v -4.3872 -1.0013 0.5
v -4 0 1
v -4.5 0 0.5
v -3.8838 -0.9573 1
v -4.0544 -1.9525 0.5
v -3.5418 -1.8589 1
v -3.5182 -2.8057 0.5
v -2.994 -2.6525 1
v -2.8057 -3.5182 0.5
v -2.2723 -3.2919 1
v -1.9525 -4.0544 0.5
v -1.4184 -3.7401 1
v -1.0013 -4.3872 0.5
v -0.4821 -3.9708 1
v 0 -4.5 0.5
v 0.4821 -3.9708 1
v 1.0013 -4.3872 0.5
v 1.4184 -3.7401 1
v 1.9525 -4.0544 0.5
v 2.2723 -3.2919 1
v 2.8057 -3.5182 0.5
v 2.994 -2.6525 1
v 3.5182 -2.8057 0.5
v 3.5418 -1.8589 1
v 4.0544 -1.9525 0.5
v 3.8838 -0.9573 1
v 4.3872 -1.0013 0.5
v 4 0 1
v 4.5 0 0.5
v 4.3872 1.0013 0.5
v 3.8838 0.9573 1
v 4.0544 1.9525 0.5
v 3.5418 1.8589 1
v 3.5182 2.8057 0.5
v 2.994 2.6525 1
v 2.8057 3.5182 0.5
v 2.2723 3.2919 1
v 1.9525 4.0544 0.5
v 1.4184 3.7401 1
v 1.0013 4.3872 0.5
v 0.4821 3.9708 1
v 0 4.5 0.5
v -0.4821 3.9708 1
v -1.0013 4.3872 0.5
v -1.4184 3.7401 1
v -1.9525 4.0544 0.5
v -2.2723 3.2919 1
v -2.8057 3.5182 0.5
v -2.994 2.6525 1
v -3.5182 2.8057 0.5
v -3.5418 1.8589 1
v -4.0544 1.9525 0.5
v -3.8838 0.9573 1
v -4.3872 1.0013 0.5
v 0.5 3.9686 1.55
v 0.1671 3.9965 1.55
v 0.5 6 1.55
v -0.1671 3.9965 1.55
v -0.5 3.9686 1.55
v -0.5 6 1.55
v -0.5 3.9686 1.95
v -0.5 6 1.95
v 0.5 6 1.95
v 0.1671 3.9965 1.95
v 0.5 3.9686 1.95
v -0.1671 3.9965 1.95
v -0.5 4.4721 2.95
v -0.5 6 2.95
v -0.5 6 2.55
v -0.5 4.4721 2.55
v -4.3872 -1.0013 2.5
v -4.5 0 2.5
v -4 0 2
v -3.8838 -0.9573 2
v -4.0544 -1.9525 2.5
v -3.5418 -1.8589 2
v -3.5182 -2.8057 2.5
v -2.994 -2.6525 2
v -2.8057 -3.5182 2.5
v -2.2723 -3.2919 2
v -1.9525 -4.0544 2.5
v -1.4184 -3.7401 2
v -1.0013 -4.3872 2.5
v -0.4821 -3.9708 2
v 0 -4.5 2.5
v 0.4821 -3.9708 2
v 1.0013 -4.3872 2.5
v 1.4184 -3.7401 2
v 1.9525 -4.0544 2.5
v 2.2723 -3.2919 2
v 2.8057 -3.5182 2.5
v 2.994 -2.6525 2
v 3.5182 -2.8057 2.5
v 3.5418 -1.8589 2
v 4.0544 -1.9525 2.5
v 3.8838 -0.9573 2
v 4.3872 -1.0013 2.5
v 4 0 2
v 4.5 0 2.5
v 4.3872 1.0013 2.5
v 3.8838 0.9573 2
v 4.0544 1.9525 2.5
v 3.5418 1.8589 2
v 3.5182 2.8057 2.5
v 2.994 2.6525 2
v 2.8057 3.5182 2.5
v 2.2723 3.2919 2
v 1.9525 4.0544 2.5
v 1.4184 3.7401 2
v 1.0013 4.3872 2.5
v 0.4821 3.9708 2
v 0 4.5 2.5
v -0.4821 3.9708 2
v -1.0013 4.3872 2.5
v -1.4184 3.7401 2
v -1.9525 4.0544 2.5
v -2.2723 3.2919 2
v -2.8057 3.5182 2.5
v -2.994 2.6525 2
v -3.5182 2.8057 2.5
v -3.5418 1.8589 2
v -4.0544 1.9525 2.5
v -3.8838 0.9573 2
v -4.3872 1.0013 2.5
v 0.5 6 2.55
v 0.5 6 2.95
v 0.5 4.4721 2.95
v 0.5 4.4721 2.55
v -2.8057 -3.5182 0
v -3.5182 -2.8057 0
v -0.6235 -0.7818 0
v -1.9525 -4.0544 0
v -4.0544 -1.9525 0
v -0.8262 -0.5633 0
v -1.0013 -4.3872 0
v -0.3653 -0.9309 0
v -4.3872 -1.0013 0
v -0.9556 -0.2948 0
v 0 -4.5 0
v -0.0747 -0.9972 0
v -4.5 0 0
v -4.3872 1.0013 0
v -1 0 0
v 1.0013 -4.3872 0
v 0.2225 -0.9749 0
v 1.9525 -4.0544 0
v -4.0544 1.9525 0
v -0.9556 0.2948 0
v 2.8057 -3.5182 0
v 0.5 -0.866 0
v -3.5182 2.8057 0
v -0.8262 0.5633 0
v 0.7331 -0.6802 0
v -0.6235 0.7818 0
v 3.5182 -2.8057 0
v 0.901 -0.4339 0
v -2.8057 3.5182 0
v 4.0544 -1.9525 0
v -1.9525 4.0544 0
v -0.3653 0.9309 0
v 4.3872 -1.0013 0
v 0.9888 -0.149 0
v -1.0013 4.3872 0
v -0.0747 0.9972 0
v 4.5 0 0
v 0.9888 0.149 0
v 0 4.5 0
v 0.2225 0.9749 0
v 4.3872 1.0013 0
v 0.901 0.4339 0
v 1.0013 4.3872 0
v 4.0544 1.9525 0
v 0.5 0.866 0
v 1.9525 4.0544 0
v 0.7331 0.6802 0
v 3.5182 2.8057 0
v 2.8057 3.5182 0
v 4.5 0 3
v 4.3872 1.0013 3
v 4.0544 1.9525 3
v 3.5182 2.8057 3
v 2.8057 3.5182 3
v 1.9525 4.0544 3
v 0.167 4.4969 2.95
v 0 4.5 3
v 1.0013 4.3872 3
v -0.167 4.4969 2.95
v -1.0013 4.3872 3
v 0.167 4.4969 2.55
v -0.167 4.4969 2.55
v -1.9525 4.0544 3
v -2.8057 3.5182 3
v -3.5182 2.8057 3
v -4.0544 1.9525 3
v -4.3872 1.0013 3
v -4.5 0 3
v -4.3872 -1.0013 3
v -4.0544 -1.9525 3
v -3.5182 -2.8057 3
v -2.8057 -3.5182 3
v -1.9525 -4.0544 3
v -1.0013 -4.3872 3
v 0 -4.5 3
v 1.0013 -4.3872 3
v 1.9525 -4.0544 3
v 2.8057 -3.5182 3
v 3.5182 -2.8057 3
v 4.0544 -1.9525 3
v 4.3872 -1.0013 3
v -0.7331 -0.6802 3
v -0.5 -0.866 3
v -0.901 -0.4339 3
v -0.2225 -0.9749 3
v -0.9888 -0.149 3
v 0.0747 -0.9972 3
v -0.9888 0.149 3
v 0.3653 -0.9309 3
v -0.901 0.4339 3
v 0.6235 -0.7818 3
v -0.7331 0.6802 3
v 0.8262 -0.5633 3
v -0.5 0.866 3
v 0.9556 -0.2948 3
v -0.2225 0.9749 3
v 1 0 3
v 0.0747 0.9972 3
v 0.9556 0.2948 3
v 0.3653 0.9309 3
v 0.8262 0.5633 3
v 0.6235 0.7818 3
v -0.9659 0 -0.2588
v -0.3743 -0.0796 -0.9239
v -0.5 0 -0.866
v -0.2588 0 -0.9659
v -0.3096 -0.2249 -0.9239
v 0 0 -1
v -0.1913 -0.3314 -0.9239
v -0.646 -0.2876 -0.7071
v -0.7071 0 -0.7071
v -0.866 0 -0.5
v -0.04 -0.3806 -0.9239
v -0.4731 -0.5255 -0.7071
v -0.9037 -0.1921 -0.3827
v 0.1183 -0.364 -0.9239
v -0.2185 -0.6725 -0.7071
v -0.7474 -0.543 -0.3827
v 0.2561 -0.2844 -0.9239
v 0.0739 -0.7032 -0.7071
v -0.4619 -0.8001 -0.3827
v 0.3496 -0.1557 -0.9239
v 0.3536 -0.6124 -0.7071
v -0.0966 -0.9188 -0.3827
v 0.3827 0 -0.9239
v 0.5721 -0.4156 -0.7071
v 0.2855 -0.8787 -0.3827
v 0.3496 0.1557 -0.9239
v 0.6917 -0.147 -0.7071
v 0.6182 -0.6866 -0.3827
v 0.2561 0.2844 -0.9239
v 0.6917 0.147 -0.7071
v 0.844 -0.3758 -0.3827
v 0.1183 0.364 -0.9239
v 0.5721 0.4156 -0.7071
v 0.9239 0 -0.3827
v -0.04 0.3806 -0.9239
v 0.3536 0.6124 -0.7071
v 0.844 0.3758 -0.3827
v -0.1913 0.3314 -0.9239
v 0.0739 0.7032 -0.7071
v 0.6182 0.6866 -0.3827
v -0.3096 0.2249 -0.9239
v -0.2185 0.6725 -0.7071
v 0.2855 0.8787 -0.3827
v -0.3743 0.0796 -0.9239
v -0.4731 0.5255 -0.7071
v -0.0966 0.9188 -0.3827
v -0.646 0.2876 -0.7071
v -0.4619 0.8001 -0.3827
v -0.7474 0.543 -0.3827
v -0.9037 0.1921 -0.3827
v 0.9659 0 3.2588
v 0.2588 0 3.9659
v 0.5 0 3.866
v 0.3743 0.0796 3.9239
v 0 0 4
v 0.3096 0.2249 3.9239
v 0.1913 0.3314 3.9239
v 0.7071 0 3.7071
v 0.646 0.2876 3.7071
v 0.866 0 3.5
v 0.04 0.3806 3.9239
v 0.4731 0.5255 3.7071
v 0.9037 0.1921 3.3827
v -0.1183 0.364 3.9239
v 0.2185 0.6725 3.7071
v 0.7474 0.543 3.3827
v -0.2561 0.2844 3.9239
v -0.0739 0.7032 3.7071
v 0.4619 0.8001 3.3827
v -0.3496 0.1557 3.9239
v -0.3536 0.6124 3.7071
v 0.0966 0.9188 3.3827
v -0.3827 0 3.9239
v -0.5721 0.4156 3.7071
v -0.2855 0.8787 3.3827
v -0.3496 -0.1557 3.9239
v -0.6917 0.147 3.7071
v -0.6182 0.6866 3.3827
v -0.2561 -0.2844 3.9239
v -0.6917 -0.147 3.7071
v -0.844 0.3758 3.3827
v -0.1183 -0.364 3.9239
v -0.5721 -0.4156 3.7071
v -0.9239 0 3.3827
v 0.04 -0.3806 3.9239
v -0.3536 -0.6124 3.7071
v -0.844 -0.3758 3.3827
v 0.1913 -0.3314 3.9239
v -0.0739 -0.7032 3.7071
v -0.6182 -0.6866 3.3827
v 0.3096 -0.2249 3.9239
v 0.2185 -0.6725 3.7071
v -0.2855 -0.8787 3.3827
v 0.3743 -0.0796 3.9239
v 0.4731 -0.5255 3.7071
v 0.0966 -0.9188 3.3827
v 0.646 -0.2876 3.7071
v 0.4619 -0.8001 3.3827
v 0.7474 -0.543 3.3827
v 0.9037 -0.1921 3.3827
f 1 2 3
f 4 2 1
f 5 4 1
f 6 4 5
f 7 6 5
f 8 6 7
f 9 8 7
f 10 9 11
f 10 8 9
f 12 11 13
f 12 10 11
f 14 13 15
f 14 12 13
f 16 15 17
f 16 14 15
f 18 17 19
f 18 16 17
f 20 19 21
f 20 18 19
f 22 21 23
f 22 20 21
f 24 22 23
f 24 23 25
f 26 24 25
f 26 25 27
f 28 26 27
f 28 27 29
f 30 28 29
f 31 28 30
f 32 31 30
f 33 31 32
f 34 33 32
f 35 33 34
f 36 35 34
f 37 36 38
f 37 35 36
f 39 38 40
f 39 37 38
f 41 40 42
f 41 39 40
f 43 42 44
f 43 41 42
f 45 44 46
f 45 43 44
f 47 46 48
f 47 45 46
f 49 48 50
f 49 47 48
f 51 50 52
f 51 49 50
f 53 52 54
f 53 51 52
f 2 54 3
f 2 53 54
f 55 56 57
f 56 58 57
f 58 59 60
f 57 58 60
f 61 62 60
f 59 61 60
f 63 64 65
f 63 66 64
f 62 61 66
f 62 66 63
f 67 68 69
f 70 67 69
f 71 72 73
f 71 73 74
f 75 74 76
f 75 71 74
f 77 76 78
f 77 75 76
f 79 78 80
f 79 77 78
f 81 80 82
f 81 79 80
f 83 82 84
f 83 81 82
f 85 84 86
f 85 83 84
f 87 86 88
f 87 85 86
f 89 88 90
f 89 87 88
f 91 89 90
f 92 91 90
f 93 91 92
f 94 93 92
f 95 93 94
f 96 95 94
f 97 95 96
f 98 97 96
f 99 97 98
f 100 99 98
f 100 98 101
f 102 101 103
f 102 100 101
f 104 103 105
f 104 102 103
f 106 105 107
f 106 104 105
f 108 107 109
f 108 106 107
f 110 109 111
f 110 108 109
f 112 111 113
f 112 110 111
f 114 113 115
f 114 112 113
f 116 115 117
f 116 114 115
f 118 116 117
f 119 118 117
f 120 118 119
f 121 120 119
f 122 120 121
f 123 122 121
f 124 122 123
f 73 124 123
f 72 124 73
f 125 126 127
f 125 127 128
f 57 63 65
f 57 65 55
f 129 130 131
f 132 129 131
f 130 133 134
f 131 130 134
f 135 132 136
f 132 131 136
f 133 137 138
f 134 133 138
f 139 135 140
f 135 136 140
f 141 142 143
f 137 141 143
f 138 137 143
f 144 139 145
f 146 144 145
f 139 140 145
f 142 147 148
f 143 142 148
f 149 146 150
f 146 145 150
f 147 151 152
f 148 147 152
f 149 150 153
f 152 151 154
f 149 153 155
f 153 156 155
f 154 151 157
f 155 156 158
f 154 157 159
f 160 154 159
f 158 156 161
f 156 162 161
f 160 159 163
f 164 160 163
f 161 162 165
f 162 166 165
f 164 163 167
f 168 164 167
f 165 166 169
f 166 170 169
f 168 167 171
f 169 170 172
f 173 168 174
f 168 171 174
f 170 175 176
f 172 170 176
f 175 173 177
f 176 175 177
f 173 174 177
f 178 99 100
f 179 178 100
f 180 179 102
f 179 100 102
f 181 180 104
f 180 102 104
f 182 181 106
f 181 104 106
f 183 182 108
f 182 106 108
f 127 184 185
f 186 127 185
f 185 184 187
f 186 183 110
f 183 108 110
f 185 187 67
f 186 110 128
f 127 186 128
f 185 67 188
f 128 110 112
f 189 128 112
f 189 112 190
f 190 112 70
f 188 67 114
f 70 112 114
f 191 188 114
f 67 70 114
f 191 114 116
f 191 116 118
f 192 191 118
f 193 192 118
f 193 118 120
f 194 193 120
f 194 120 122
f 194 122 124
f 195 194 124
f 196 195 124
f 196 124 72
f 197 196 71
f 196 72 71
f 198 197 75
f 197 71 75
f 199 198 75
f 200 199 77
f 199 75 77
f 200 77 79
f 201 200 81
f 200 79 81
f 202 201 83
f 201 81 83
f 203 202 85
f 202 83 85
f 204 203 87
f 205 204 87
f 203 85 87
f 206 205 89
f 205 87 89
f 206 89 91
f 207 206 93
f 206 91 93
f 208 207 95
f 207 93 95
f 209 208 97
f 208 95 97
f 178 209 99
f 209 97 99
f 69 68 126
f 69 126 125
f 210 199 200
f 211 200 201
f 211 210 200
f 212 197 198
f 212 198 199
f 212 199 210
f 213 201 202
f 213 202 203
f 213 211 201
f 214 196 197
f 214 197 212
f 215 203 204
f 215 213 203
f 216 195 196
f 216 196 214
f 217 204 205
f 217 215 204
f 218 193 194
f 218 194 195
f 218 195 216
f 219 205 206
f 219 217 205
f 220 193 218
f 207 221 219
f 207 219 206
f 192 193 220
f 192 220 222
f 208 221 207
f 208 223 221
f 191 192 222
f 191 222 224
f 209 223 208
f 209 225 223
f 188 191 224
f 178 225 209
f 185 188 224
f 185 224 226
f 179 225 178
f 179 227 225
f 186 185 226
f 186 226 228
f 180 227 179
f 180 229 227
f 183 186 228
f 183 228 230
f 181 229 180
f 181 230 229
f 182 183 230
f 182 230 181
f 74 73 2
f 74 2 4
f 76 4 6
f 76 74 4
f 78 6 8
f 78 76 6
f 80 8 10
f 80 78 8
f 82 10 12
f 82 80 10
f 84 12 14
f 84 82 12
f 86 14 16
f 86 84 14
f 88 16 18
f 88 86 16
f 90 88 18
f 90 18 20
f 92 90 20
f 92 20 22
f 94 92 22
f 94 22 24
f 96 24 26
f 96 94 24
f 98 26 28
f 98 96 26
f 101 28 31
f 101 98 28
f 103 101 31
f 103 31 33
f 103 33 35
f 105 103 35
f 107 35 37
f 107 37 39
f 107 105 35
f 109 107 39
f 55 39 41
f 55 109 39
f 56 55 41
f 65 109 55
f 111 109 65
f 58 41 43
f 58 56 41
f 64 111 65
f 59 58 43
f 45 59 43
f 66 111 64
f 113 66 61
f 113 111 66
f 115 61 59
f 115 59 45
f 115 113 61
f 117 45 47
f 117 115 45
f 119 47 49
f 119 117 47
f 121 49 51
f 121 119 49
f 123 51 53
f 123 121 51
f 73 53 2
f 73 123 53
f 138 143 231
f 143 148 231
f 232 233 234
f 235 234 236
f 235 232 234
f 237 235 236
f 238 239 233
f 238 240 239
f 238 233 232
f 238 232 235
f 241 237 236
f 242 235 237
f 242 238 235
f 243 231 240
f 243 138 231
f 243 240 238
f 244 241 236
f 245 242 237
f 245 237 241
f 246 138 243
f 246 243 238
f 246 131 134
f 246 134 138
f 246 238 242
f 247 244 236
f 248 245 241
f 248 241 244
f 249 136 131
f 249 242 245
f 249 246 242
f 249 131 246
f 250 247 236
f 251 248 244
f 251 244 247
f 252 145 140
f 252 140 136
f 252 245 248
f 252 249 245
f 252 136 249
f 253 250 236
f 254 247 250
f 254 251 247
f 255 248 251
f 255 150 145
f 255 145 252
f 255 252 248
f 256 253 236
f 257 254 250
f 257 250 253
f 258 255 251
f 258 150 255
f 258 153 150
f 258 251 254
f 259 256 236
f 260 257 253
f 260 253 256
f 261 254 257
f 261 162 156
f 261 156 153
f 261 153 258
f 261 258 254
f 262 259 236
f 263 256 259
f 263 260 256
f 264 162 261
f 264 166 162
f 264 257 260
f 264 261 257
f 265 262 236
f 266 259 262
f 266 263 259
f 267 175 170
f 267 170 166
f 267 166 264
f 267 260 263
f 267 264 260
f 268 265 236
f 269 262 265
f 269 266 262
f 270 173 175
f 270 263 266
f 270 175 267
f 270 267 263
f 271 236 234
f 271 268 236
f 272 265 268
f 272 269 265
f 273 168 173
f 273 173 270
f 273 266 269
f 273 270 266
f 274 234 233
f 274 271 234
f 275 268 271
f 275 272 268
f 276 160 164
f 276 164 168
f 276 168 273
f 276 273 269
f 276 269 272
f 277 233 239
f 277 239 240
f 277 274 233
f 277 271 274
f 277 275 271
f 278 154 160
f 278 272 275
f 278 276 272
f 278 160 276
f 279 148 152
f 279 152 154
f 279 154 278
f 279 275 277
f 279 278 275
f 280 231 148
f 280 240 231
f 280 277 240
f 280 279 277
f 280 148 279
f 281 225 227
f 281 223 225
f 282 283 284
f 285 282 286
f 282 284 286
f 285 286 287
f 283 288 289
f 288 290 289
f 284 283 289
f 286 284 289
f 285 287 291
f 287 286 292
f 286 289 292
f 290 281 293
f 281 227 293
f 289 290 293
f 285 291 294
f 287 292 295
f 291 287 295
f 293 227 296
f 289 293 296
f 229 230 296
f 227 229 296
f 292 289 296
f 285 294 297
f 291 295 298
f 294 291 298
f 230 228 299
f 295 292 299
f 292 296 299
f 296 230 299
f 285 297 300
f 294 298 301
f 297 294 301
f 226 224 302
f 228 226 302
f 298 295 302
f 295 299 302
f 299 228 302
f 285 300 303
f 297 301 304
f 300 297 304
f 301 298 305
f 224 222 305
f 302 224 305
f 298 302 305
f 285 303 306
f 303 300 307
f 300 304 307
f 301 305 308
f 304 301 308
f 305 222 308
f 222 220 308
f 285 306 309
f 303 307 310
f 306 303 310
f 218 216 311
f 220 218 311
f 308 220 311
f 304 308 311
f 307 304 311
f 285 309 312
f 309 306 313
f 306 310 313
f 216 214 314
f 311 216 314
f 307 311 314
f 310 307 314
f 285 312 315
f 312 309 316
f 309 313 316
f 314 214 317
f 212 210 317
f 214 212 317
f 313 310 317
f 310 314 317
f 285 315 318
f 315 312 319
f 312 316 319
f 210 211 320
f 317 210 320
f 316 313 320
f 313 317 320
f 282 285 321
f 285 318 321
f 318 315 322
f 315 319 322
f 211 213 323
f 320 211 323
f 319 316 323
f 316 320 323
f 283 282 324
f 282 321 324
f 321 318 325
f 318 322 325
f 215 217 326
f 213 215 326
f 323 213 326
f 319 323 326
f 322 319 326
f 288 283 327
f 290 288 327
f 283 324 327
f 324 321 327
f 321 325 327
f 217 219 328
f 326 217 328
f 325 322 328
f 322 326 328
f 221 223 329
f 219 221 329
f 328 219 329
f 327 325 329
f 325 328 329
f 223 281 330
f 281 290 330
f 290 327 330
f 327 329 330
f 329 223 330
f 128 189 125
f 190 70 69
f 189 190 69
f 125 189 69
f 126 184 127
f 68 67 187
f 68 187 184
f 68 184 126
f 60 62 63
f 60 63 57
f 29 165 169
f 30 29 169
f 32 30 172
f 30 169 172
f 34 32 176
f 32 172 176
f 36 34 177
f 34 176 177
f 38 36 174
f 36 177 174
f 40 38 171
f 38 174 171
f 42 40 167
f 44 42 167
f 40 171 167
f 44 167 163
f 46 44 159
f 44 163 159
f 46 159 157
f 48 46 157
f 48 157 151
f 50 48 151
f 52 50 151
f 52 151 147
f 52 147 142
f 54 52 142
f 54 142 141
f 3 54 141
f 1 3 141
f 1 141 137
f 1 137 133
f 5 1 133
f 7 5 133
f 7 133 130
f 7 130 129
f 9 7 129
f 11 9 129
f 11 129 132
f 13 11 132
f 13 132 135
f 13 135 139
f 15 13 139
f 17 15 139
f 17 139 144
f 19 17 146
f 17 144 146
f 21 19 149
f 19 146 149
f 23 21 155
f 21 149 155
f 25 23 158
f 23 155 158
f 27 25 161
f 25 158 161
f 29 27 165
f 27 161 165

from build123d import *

# Parameters (mm, degrees)
SKETCH1_R                = 4.5
MAIN_BASE_DEPTH          = 3
BOSS_EXTRUDE1_DEPTH      = 0.5
BOSS_EXTRUDE1_DEPTH_BACK = 0.5
SKETCH5_W                = 0.4
SKETCH5_H                = 2
SKETCH5_H_2              = 2.5


with BuildPart() as part:
    # Sketch1 → main_base (new body)
    with BuildSketch(Plane.XY):
        Circle(SKETCH1_R)
    extrude(amount=MAIN_BASE_DEPTH)

    # Sketch2 → pulley_cut_out (revolve, cut)
    with BuildSketch(Plane(origin=(0, 0, 0), x_dir=(0, 0, -1), z_dir=(1, 0, 0))):
        Polygon((-2.5, 4.5), (-0.5, 4.5), (-1, 4), (-2, 4), align=None)
    revolve(axis=Axis((0, 0, 0), (0, 0, 1)), mode=Mode.SUBTRACT)

    # Sketch4 → rotating_point (revolve)
    with BuildSketch(Plane(origin=(0, 0, 0), x_dir=(1, 0, 0), z_dir=(0, 1, 0))):
        with BuildLine():
            ThreePointArc((0, 1), (-0.707106781, 0.707106781), (-1, 0))
            Line((-1, 0), (0, 0))
            Line((0, 0), (0, 1))
        make_face()
        with BuildLine():
            Line((0, -4), (0, -3))
            Line((0, -3), (-1, -3))
            ThreePointArc((-1, -3), (-0.707106781, -3.707106781), (0, -4))
        make_face()
    revolve(axis=Axis((0, 0, -1), (0, 0, 1)))

    # Sketch5 → Boss-Extrude1 (add, two sides: drawn at the far end of the back side and taken through both)
    with BuildSketch(Plane(origin=(0, 0, 0), x_dir=(0, 0, -1), z_dir=(1, 0, 0)).offset(-BOSS_EXTRUDE1_DEPTH_BACK)):
        with Locations((-2.75, 5)):
            Rectangle(SKETCH5_W, SKETCH5_H)
        with Locations((-1.75, 4.75)):
            Rectangle(SKETCH5_W, SKETCH5_H_2)
    extrude(amount=BOSS_EXTRUDE1_DEPTH + BOSS_EXTRUDE1_DEPTH_BACK)


solid = part.part
